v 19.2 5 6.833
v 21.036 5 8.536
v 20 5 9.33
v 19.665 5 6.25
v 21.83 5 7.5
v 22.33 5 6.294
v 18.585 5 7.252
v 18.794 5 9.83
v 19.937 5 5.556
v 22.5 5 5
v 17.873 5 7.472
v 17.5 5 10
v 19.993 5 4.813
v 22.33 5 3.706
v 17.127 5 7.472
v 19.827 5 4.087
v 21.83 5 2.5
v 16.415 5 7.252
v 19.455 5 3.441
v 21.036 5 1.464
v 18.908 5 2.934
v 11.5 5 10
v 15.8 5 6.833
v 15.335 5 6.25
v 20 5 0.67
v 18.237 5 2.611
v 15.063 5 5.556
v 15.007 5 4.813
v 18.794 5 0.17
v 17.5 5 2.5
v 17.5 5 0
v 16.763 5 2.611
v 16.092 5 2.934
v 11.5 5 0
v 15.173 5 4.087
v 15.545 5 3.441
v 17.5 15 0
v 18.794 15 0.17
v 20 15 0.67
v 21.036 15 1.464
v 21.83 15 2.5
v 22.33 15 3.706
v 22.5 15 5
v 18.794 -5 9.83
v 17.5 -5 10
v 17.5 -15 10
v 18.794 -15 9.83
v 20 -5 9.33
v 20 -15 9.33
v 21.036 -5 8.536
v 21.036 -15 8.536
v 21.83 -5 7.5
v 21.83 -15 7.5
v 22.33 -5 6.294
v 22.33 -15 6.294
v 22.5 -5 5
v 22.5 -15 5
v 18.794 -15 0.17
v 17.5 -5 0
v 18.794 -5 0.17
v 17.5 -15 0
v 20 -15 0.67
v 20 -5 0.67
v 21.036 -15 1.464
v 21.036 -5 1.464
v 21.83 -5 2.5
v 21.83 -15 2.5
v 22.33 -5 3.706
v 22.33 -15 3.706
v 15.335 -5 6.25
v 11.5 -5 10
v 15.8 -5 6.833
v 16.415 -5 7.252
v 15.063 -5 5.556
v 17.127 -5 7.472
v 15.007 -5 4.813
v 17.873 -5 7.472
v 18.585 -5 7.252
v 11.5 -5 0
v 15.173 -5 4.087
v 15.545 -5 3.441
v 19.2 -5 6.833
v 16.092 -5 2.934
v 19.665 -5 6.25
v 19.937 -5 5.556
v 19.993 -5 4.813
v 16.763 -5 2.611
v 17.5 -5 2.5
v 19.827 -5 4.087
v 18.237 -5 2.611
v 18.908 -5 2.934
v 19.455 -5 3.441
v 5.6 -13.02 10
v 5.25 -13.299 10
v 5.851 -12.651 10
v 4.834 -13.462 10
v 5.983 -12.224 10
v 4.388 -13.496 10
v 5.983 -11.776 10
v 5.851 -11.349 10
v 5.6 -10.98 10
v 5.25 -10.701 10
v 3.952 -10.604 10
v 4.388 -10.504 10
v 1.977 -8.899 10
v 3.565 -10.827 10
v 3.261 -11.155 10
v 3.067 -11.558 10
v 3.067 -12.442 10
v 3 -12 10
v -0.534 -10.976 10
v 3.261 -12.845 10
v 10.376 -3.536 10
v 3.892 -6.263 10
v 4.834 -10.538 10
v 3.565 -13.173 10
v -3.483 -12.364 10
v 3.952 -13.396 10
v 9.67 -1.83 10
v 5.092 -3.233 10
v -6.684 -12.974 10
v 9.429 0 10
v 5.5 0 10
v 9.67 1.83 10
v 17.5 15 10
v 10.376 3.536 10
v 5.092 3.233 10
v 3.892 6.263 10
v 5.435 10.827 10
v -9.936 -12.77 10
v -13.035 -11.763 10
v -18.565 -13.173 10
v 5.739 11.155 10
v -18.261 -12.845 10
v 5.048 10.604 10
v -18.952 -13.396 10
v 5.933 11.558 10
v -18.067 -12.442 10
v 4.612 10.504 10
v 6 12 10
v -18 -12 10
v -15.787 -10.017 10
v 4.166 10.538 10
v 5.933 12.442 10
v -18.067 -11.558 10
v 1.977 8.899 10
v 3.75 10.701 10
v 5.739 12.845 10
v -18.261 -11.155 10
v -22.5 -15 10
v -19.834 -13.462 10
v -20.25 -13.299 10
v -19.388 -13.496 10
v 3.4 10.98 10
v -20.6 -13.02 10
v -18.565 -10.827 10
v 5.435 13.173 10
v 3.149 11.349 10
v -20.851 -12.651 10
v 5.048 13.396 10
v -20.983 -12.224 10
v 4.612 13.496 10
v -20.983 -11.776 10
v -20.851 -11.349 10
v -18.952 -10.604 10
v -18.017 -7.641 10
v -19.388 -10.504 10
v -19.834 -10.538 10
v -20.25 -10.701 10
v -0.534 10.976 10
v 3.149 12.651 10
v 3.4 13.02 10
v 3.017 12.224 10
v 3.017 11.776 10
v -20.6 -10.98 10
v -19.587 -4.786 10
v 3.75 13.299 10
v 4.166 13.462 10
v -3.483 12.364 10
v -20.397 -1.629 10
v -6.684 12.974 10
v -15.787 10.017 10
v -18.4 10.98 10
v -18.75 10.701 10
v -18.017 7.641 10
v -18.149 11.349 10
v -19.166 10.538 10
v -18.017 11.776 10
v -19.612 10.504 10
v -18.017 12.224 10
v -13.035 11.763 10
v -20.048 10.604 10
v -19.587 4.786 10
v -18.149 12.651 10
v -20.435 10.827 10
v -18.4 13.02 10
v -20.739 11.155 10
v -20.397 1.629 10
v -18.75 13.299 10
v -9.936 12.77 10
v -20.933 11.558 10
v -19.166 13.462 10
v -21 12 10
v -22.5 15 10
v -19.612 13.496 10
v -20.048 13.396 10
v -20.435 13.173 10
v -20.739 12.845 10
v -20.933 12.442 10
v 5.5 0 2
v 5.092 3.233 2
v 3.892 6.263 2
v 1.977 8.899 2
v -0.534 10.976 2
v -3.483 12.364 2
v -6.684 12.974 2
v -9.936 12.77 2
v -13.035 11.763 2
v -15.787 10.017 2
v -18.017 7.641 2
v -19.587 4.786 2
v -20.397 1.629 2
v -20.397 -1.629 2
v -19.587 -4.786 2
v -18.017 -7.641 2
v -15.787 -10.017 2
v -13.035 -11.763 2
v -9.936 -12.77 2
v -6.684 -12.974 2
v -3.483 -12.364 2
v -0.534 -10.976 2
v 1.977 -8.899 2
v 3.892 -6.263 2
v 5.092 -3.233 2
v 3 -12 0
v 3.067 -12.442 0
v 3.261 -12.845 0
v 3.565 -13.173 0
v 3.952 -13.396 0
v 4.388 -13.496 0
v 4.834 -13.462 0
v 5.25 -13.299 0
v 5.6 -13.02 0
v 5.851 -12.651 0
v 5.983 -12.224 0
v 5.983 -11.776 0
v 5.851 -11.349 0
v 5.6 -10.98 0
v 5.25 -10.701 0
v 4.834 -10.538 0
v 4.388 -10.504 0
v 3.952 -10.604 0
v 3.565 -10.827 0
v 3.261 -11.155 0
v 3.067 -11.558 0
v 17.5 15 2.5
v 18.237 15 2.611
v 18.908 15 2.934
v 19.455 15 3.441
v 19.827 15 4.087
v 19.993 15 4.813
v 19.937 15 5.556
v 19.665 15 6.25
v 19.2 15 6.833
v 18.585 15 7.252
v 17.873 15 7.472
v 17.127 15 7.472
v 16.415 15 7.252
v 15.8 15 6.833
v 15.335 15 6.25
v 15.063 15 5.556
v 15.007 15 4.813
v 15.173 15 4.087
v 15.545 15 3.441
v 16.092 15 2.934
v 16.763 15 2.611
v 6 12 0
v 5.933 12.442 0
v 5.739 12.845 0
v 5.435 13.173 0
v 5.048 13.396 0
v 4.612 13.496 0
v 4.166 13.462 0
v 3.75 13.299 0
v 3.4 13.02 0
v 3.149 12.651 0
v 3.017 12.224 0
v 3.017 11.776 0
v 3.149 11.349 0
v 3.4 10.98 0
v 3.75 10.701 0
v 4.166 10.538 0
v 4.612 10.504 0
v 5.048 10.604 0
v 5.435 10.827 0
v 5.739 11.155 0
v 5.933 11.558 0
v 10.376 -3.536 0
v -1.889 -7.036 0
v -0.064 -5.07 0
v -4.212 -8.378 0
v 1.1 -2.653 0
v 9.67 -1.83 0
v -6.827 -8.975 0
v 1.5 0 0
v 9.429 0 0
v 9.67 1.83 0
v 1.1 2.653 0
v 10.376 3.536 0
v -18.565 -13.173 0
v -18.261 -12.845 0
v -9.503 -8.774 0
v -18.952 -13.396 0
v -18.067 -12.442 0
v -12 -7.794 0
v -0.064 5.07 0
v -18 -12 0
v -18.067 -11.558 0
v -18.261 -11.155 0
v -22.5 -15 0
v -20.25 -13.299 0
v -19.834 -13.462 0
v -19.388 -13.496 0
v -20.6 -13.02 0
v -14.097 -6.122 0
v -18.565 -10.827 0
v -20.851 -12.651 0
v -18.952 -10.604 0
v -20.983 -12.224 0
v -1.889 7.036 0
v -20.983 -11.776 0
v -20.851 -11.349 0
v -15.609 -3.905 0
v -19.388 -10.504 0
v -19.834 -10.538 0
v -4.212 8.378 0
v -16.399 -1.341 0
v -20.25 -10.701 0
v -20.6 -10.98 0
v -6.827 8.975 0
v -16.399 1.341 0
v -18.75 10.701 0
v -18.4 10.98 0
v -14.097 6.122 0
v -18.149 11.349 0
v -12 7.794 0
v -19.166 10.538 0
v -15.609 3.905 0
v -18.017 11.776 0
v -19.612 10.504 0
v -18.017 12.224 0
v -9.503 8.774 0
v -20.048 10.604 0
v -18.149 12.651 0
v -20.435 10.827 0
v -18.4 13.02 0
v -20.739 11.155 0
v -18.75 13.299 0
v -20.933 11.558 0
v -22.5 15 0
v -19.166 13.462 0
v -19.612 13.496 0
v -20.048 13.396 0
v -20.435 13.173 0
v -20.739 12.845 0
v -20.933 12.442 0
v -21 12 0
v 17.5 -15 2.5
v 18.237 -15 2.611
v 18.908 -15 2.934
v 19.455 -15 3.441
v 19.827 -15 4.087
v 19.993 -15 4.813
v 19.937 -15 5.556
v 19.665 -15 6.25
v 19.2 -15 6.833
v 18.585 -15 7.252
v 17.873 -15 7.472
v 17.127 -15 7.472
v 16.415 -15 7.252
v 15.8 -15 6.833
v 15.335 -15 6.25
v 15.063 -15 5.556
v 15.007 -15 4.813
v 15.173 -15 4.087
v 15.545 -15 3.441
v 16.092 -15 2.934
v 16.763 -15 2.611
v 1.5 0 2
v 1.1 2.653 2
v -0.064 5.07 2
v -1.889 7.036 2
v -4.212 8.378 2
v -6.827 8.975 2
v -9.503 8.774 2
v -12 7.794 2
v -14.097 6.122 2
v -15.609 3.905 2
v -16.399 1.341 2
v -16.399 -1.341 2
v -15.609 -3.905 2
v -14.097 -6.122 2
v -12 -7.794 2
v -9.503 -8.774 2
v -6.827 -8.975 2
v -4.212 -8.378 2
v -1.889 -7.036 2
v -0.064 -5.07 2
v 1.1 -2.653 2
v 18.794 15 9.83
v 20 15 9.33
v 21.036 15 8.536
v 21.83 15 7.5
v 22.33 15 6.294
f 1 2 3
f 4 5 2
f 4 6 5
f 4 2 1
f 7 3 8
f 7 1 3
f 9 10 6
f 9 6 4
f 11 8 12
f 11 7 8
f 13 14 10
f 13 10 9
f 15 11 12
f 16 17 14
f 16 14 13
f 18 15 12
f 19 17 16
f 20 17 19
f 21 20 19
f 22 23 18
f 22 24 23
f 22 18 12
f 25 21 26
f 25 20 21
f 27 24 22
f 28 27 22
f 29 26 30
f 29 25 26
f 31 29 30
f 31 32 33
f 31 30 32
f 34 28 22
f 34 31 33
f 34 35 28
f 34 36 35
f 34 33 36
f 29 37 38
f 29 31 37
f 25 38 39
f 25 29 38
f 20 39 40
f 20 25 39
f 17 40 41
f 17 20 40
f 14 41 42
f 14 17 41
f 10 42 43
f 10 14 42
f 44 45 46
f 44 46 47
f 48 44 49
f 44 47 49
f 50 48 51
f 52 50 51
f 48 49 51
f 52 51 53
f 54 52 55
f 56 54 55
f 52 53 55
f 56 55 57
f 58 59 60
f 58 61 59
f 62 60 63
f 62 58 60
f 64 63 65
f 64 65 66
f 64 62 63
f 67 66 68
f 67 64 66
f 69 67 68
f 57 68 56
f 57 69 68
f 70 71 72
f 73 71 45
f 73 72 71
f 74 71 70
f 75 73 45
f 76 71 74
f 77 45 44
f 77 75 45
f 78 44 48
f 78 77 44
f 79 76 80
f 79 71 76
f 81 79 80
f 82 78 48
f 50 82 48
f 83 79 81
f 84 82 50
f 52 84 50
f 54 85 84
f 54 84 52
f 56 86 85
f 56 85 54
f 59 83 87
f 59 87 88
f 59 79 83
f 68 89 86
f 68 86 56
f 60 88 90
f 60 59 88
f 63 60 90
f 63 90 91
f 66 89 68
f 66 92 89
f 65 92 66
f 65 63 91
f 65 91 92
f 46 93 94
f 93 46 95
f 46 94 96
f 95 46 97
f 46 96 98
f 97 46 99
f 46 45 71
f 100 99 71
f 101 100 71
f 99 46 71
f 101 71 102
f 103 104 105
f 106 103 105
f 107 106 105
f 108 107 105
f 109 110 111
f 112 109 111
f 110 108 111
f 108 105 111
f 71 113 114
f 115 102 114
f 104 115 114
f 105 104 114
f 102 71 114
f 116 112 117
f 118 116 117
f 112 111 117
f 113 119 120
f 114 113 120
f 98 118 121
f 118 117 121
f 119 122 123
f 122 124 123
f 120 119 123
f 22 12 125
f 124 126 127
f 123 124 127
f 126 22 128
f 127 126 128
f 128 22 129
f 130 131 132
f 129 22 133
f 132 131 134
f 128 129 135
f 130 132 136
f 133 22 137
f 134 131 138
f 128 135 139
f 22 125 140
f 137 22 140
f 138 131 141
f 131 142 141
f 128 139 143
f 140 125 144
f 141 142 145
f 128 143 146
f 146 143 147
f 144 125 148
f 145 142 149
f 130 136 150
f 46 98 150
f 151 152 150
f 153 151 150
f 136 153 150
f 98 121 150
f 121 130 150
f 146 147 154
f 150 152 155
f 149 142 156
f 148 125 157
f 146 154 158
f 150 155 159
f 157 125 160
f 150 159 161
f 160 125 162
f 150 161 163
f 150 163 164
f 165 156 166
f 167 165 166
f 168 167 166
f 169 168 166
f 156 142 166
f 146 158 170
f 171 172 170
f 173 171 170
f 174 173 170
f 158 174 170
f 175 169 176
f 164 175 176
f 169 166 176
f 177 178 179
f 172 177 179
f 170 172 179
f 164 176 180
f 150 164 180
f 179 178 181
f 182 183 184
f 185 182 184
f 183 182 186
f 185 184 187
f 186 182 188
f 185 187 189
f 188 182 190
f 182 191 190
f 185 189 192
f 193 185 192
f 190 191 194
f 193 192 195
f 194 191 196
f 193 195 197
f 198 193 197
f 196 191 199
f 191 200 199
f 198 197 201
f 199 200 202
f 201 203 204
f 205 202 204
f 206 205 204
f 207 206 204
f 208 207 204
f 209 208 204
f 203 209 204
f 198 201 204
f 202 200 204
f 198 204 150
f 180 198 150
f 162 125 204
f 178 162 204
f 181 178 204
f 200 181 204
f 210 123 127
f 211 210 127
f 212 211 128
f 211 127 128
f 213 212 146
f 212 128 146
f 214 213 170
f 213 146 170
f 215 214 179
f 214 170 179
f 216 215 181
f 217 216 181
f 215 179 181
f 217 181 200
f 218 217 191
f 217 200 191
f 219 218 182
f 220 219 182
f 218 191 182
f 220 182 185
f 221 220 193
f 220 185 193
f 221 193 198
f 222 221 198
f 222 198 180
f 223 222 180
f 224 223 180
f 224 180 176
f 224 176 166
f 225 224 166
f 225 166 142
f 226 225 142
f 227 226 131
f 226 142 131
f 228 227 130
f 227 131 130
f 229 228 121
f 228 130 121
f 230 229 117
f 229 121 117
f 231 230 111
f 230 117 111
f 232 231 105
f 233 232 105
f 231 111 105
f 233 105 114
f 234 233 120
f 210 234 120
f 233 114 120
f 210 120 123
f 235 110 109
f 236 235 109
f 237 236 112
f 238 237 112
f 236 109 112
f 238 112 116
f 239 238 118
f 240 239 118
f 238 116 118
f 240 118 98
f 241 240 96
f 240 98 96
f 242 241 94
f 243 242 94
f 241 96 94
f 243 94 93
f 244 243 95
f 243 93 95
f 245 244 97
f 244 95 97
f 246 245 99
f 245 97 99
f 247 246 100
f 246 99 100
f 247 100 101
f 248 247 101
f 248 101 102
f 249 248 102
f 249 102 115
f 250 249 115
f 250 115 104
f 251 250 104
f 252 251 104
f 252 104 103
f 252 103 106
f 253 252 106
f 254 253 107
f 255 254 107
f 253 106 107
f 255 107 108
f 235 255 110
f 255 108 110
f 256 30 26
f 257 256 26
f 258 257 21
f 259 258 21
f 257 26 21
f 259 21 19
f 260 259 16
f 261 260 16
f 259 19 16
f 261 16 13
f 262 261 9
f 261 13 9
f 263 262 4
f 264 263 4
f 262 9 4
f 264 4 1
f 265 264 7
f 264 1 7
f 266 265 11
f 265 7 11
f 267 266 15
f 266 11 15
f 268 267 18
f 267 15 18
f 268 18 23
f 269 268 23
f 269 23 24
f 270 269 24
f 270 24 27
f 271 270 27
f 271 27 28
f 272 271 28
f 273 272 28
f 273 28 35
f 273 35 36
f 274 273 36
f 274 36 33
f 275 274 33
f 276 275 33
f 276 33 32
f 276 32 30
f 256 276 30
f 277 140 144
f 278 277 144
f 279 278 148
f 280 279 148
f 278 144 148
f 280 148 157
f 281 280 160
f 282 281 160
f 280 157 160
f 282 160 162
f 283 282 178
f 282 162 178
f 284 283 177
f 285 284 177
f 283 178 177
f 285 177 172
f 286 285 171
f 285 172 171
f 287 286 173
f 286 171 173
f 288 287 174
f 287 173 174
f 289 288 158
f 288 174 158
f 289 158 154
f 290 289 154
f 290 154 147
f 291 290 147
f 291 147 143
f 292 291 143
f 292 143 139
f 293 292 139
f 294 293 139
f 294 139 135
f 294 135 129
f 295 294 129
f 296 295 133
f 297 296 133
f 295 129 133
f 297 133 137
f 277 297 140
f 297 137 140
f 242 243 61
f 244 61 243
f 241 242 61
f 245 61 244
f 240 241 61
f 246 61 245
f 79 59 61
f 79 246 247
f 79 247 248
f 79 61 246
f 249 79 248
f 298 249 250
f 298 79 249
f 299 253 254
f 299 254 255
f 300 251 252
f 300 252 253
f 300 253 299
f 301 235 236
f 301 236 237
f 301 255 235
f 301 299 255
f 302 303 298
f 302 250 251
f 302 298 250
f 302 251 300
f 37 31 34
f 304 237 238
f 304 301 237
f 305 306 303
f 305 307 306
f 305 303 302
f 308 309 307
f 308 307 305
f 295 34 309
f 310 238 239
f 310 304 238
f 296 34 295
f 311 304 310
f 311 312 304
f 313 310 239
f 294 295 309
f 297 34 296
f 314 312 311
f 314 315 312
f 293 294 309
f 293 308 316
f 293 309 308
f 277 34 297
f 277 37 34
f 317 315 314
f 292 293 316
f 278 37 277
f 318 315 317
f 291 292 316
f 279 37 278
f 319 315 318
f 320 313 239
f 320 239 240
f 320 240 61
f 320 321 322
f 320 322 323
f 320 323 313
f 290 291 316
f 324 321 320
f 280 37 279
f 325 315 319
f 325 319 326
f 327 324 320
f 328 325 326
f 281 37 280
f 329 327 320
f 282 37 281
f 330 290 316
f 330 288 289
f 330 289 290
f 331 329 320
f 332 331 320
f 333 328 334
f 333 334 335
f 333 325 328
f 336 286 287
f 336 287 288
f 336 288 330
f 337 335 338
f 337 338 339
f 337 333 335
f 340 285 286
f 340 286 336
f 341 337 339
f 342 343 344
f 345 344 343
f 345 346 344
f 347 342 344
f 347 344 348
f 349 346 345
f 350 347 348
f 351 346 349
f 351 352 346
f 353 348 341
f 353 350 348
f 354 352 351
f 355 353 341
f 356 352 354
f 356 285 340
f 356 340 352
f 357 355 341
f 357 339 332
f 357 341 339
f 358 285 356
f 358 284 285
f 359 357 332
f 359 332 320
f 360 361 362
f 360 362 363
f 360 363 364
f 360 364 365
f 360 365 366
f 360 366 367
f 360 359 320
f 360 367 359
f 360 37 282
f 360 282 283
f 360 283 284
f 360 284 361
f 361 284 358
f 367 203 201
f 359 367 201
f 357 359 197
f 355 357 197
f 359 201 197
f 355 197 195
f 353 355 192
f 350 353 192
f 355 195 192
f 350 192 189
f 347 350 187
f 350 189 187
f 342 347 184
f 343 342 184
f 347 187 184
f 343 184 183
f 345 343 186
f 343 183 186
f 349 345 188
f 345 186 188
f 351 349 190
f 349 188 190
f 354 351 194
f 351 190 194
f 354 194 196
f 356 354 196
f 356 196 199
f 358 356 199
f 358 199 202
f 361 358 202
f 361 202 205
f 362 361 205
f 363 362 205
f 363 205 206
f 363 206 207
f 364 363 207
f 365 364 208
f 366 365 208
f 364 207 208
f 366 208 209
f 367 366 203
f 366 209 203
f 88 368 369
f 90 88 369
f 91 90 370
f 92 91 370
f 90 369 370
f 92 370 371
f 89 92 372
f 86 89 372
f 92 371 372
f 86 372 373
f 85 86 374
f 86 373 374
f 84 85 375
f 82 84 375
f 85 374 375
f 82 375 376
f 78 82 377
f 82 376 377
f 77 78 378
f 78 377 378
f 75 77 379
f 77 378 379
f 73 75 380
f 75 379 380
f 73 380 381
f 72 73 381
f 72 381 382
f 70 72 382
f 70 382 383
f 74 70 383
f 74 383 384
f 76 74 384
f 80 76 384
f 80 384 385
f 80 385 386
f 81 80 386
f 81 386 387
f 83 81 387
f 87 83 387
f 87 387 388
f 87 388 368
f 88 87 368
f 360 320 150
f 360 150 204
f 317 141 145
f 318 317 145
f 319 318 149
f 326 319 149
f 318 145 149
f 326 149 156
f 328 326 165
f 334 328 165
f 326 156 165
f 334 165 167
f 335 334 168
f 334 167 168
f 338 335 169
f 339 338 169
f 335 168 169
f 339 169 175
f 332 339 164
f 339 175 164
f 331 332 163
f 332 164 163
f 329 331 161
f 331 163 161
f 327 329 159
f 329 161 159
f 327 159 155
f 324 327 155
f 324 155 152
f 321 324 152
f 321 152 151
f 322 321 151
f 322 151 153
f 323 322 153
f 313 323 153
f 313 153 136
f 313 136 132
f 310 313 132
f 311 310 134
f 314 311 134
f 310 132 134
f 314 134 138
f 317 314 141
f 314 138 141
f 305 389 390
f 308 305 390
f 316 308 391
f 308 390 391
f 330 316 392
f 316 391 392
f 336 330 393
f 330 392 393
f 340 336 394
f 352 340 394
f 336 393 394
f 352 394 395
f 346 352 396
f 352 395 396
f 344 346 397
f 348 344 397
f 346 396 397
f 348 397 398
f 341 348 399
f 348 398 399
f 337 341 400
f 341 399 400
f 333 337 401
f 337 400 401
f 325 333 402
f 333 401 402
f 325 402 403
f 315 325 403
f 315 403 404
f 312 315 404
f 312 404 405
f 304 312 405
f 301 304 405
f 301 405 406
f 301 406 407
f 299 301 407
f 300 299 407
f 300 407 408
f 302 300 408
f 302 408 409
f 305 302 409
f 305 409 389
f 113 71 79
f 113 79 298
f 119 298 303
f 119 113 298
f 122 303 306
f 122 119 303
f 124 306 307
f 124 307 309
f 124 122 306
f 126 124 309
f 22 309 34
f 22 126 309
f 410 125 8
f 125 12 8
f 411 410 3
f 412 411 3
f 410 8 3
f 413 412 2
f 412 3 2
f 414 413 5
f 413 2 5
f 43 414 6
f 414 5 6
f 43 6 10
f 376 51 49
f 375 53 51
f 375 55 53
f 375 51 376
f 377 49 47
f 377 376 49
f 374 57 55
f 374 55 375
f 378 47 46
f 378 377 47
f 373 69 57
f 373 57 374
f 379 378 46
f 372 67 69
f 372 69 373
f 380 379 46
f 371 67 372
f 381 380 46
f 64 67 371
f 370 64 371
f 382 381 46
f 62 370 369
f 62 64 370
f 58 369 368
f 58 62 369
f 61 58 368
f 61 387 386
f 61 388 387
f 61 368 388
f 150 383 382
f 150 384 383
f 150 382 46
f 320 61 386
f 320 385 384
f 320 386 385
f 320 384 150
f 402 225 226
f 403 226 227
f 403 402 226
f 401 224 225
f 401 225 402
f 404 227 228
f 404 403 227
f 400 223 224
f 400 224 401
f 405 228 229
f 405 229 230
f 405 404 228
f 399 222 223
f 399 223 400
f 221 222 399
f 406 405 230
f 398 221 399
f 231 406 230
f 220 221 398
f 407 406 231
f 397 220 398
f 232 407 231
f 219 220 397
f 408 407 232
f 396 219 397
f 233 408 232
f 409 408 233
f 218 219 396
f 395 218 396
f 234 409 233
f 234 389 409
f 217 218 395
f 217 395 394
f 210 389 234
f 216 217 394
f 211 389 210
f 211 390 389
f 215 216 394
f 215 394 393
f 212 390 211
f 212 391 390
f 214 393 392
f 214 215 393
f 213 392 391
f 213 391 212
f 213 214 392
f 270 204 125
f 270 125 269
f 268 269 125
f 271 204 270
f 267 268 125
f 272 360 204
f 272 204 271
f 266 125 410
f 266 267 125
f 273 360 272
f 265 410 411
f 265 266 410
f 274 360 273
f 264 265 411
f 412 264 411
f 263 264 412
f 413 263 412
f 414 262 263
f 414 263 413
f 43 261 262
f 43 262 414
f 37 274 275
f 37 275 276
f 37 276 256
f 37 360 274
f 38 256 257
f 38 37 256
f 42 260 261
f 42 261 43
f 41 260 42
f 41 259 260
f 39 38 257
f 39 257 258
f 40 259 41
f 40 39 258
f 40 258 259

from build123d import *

# Parameters (mm, degrees)
RESSALTO_EXTRUS_O1_DEPTH = 10
CORTE_EXTRUS_O1_REACH    = 40.81
ESBO_O2_R                = 2.5
CORTE_EXTRUS_O2_DEPTH    = 10
ESBO_O5_R                = 13
CORTE_EXTRUS_O3_DEPTH    = 8
ESBO_O6_R                = 9
CORTE_EXTRUS_O4_DEPTH    = 29.200177304
FILETE1_R                = 5
ESBO_O7_R                = 1.5
CORTE_EXTRUS_O5_DEPTH    = 10


with BuildPart() as part:
    # Esboço1 → Ressalto-extrusão1 (new body)
    with BuildSketch(Plane.XY):
        Polygon((-22.5, 15), (22.5, 15), (22.5, 5), (11.5, 5), (11.5, -5), (22.5, -5), (22.5, -15), (-22.5, -15), align=None)
    extrude(amount=RESSALTO_EXTRUS_O1_DEPTH)

    # Corte-extrusão1: up to this face of the body (flat: up to its plane)
    corte_extrus_o1_end = Plane(part.part.faces().sort_by_distance((0, 15, 5))[0])
    # Esboço2 → Corte-extrusão1 (cut, up to the picked face)
    with BuildSketch(Plane.XZ.offset(15), mode=Mode.PRIVATE) as corte_extrus_o1_sk1:
        with Locations(Location((17.5, 5, 0), (0, 0, 270))):
            Circle(ESBO_O2_R)
    corte_extrus_o1_tool1 = split(extrude(corte_extrus_o1_sk1.sketch, amount=-CORTE_EXTRUS_O1_REACH, mode=Mode.PRIVATE), bisect_by=corte_extrus_o1_end, keep=Keep.BOTH, mode=Mode.PRIVATE)
    add(corte_extrus_o1_tool1.solids().sort_by(Axis((17.5, -15, 5), (0, 1, 0)))[0], mode=Mode.SUBTRACT)

    # Esboço4 → Corte-extrusão2 (cut)
    with BuildSketch(Plane.XY.offset(10)):
        with BuildLine():
            Line((11.5, 5), (11.5, -5))
            ThreePointArc((11.5, -5), (9.428932188, 0), (11.5, 5))
        make_face()
    extrude(amount=-CORTE_EXTRUS_O2_DEPTH, mode=Mode.SUBTRACT)

    # Esboço5 → Corte-extrusão3 (cut)
    with BuildSketch(Plane.XY.offset(10)):
        with Locations((-7.5, 0)):
            Circle(ESBO_O5_R)
    extrude(amount=-CORTE_EXTRUS_O3_DEPTH, mode=Mode.SUBTRACT)

    # Esboço6 → Corte-extrusão4 (cut, through all)
    with BuildSketch(Plane.XY.offset(2)):
        with Locations((-7.5, 0)):
            Circle(ESBO_O6_R)
    extrude(amount=-CORTE_EXTRUS_O4_DEPTH, mode=Mode.SUBTRACT)

    # Filete1
    filete1_edges = [part.edges().sort_by_distance(p)[0] for p in [
        (22.5, 10, 0),
        (22.5, 10, 10),
        (22.5, -10, 0),
        (22.5, -10, 10),
    ]]
    fillet(filete1_edges, radius=FILETE1_R - 0.0001)  # a hair under: the kernel refuses the full size

    # Esboço7 → Corte-extrusão5 (cut)
    with BuildSketch(Plane.XY.offset(10)):
        with Locations((-19.5, -12)):
            Circle(ESBO_O7_R)
        with Locations(Location((-19.5, 12, 0), (0, 0, 180))):
            Circle(ESBO_O7_R)
        with Locations((4.5, 12)):
            Circle(ESBO_O7_R)
        with Locations(Location((4.5, -12, 0), (0, 0, 180))):
            Circle(ESBO_O7_R)
    extrude(amount=-CORTE_EXTRUS_O5_DEPTH, mode=Mode.SUBTRACT)


solid = part.part
